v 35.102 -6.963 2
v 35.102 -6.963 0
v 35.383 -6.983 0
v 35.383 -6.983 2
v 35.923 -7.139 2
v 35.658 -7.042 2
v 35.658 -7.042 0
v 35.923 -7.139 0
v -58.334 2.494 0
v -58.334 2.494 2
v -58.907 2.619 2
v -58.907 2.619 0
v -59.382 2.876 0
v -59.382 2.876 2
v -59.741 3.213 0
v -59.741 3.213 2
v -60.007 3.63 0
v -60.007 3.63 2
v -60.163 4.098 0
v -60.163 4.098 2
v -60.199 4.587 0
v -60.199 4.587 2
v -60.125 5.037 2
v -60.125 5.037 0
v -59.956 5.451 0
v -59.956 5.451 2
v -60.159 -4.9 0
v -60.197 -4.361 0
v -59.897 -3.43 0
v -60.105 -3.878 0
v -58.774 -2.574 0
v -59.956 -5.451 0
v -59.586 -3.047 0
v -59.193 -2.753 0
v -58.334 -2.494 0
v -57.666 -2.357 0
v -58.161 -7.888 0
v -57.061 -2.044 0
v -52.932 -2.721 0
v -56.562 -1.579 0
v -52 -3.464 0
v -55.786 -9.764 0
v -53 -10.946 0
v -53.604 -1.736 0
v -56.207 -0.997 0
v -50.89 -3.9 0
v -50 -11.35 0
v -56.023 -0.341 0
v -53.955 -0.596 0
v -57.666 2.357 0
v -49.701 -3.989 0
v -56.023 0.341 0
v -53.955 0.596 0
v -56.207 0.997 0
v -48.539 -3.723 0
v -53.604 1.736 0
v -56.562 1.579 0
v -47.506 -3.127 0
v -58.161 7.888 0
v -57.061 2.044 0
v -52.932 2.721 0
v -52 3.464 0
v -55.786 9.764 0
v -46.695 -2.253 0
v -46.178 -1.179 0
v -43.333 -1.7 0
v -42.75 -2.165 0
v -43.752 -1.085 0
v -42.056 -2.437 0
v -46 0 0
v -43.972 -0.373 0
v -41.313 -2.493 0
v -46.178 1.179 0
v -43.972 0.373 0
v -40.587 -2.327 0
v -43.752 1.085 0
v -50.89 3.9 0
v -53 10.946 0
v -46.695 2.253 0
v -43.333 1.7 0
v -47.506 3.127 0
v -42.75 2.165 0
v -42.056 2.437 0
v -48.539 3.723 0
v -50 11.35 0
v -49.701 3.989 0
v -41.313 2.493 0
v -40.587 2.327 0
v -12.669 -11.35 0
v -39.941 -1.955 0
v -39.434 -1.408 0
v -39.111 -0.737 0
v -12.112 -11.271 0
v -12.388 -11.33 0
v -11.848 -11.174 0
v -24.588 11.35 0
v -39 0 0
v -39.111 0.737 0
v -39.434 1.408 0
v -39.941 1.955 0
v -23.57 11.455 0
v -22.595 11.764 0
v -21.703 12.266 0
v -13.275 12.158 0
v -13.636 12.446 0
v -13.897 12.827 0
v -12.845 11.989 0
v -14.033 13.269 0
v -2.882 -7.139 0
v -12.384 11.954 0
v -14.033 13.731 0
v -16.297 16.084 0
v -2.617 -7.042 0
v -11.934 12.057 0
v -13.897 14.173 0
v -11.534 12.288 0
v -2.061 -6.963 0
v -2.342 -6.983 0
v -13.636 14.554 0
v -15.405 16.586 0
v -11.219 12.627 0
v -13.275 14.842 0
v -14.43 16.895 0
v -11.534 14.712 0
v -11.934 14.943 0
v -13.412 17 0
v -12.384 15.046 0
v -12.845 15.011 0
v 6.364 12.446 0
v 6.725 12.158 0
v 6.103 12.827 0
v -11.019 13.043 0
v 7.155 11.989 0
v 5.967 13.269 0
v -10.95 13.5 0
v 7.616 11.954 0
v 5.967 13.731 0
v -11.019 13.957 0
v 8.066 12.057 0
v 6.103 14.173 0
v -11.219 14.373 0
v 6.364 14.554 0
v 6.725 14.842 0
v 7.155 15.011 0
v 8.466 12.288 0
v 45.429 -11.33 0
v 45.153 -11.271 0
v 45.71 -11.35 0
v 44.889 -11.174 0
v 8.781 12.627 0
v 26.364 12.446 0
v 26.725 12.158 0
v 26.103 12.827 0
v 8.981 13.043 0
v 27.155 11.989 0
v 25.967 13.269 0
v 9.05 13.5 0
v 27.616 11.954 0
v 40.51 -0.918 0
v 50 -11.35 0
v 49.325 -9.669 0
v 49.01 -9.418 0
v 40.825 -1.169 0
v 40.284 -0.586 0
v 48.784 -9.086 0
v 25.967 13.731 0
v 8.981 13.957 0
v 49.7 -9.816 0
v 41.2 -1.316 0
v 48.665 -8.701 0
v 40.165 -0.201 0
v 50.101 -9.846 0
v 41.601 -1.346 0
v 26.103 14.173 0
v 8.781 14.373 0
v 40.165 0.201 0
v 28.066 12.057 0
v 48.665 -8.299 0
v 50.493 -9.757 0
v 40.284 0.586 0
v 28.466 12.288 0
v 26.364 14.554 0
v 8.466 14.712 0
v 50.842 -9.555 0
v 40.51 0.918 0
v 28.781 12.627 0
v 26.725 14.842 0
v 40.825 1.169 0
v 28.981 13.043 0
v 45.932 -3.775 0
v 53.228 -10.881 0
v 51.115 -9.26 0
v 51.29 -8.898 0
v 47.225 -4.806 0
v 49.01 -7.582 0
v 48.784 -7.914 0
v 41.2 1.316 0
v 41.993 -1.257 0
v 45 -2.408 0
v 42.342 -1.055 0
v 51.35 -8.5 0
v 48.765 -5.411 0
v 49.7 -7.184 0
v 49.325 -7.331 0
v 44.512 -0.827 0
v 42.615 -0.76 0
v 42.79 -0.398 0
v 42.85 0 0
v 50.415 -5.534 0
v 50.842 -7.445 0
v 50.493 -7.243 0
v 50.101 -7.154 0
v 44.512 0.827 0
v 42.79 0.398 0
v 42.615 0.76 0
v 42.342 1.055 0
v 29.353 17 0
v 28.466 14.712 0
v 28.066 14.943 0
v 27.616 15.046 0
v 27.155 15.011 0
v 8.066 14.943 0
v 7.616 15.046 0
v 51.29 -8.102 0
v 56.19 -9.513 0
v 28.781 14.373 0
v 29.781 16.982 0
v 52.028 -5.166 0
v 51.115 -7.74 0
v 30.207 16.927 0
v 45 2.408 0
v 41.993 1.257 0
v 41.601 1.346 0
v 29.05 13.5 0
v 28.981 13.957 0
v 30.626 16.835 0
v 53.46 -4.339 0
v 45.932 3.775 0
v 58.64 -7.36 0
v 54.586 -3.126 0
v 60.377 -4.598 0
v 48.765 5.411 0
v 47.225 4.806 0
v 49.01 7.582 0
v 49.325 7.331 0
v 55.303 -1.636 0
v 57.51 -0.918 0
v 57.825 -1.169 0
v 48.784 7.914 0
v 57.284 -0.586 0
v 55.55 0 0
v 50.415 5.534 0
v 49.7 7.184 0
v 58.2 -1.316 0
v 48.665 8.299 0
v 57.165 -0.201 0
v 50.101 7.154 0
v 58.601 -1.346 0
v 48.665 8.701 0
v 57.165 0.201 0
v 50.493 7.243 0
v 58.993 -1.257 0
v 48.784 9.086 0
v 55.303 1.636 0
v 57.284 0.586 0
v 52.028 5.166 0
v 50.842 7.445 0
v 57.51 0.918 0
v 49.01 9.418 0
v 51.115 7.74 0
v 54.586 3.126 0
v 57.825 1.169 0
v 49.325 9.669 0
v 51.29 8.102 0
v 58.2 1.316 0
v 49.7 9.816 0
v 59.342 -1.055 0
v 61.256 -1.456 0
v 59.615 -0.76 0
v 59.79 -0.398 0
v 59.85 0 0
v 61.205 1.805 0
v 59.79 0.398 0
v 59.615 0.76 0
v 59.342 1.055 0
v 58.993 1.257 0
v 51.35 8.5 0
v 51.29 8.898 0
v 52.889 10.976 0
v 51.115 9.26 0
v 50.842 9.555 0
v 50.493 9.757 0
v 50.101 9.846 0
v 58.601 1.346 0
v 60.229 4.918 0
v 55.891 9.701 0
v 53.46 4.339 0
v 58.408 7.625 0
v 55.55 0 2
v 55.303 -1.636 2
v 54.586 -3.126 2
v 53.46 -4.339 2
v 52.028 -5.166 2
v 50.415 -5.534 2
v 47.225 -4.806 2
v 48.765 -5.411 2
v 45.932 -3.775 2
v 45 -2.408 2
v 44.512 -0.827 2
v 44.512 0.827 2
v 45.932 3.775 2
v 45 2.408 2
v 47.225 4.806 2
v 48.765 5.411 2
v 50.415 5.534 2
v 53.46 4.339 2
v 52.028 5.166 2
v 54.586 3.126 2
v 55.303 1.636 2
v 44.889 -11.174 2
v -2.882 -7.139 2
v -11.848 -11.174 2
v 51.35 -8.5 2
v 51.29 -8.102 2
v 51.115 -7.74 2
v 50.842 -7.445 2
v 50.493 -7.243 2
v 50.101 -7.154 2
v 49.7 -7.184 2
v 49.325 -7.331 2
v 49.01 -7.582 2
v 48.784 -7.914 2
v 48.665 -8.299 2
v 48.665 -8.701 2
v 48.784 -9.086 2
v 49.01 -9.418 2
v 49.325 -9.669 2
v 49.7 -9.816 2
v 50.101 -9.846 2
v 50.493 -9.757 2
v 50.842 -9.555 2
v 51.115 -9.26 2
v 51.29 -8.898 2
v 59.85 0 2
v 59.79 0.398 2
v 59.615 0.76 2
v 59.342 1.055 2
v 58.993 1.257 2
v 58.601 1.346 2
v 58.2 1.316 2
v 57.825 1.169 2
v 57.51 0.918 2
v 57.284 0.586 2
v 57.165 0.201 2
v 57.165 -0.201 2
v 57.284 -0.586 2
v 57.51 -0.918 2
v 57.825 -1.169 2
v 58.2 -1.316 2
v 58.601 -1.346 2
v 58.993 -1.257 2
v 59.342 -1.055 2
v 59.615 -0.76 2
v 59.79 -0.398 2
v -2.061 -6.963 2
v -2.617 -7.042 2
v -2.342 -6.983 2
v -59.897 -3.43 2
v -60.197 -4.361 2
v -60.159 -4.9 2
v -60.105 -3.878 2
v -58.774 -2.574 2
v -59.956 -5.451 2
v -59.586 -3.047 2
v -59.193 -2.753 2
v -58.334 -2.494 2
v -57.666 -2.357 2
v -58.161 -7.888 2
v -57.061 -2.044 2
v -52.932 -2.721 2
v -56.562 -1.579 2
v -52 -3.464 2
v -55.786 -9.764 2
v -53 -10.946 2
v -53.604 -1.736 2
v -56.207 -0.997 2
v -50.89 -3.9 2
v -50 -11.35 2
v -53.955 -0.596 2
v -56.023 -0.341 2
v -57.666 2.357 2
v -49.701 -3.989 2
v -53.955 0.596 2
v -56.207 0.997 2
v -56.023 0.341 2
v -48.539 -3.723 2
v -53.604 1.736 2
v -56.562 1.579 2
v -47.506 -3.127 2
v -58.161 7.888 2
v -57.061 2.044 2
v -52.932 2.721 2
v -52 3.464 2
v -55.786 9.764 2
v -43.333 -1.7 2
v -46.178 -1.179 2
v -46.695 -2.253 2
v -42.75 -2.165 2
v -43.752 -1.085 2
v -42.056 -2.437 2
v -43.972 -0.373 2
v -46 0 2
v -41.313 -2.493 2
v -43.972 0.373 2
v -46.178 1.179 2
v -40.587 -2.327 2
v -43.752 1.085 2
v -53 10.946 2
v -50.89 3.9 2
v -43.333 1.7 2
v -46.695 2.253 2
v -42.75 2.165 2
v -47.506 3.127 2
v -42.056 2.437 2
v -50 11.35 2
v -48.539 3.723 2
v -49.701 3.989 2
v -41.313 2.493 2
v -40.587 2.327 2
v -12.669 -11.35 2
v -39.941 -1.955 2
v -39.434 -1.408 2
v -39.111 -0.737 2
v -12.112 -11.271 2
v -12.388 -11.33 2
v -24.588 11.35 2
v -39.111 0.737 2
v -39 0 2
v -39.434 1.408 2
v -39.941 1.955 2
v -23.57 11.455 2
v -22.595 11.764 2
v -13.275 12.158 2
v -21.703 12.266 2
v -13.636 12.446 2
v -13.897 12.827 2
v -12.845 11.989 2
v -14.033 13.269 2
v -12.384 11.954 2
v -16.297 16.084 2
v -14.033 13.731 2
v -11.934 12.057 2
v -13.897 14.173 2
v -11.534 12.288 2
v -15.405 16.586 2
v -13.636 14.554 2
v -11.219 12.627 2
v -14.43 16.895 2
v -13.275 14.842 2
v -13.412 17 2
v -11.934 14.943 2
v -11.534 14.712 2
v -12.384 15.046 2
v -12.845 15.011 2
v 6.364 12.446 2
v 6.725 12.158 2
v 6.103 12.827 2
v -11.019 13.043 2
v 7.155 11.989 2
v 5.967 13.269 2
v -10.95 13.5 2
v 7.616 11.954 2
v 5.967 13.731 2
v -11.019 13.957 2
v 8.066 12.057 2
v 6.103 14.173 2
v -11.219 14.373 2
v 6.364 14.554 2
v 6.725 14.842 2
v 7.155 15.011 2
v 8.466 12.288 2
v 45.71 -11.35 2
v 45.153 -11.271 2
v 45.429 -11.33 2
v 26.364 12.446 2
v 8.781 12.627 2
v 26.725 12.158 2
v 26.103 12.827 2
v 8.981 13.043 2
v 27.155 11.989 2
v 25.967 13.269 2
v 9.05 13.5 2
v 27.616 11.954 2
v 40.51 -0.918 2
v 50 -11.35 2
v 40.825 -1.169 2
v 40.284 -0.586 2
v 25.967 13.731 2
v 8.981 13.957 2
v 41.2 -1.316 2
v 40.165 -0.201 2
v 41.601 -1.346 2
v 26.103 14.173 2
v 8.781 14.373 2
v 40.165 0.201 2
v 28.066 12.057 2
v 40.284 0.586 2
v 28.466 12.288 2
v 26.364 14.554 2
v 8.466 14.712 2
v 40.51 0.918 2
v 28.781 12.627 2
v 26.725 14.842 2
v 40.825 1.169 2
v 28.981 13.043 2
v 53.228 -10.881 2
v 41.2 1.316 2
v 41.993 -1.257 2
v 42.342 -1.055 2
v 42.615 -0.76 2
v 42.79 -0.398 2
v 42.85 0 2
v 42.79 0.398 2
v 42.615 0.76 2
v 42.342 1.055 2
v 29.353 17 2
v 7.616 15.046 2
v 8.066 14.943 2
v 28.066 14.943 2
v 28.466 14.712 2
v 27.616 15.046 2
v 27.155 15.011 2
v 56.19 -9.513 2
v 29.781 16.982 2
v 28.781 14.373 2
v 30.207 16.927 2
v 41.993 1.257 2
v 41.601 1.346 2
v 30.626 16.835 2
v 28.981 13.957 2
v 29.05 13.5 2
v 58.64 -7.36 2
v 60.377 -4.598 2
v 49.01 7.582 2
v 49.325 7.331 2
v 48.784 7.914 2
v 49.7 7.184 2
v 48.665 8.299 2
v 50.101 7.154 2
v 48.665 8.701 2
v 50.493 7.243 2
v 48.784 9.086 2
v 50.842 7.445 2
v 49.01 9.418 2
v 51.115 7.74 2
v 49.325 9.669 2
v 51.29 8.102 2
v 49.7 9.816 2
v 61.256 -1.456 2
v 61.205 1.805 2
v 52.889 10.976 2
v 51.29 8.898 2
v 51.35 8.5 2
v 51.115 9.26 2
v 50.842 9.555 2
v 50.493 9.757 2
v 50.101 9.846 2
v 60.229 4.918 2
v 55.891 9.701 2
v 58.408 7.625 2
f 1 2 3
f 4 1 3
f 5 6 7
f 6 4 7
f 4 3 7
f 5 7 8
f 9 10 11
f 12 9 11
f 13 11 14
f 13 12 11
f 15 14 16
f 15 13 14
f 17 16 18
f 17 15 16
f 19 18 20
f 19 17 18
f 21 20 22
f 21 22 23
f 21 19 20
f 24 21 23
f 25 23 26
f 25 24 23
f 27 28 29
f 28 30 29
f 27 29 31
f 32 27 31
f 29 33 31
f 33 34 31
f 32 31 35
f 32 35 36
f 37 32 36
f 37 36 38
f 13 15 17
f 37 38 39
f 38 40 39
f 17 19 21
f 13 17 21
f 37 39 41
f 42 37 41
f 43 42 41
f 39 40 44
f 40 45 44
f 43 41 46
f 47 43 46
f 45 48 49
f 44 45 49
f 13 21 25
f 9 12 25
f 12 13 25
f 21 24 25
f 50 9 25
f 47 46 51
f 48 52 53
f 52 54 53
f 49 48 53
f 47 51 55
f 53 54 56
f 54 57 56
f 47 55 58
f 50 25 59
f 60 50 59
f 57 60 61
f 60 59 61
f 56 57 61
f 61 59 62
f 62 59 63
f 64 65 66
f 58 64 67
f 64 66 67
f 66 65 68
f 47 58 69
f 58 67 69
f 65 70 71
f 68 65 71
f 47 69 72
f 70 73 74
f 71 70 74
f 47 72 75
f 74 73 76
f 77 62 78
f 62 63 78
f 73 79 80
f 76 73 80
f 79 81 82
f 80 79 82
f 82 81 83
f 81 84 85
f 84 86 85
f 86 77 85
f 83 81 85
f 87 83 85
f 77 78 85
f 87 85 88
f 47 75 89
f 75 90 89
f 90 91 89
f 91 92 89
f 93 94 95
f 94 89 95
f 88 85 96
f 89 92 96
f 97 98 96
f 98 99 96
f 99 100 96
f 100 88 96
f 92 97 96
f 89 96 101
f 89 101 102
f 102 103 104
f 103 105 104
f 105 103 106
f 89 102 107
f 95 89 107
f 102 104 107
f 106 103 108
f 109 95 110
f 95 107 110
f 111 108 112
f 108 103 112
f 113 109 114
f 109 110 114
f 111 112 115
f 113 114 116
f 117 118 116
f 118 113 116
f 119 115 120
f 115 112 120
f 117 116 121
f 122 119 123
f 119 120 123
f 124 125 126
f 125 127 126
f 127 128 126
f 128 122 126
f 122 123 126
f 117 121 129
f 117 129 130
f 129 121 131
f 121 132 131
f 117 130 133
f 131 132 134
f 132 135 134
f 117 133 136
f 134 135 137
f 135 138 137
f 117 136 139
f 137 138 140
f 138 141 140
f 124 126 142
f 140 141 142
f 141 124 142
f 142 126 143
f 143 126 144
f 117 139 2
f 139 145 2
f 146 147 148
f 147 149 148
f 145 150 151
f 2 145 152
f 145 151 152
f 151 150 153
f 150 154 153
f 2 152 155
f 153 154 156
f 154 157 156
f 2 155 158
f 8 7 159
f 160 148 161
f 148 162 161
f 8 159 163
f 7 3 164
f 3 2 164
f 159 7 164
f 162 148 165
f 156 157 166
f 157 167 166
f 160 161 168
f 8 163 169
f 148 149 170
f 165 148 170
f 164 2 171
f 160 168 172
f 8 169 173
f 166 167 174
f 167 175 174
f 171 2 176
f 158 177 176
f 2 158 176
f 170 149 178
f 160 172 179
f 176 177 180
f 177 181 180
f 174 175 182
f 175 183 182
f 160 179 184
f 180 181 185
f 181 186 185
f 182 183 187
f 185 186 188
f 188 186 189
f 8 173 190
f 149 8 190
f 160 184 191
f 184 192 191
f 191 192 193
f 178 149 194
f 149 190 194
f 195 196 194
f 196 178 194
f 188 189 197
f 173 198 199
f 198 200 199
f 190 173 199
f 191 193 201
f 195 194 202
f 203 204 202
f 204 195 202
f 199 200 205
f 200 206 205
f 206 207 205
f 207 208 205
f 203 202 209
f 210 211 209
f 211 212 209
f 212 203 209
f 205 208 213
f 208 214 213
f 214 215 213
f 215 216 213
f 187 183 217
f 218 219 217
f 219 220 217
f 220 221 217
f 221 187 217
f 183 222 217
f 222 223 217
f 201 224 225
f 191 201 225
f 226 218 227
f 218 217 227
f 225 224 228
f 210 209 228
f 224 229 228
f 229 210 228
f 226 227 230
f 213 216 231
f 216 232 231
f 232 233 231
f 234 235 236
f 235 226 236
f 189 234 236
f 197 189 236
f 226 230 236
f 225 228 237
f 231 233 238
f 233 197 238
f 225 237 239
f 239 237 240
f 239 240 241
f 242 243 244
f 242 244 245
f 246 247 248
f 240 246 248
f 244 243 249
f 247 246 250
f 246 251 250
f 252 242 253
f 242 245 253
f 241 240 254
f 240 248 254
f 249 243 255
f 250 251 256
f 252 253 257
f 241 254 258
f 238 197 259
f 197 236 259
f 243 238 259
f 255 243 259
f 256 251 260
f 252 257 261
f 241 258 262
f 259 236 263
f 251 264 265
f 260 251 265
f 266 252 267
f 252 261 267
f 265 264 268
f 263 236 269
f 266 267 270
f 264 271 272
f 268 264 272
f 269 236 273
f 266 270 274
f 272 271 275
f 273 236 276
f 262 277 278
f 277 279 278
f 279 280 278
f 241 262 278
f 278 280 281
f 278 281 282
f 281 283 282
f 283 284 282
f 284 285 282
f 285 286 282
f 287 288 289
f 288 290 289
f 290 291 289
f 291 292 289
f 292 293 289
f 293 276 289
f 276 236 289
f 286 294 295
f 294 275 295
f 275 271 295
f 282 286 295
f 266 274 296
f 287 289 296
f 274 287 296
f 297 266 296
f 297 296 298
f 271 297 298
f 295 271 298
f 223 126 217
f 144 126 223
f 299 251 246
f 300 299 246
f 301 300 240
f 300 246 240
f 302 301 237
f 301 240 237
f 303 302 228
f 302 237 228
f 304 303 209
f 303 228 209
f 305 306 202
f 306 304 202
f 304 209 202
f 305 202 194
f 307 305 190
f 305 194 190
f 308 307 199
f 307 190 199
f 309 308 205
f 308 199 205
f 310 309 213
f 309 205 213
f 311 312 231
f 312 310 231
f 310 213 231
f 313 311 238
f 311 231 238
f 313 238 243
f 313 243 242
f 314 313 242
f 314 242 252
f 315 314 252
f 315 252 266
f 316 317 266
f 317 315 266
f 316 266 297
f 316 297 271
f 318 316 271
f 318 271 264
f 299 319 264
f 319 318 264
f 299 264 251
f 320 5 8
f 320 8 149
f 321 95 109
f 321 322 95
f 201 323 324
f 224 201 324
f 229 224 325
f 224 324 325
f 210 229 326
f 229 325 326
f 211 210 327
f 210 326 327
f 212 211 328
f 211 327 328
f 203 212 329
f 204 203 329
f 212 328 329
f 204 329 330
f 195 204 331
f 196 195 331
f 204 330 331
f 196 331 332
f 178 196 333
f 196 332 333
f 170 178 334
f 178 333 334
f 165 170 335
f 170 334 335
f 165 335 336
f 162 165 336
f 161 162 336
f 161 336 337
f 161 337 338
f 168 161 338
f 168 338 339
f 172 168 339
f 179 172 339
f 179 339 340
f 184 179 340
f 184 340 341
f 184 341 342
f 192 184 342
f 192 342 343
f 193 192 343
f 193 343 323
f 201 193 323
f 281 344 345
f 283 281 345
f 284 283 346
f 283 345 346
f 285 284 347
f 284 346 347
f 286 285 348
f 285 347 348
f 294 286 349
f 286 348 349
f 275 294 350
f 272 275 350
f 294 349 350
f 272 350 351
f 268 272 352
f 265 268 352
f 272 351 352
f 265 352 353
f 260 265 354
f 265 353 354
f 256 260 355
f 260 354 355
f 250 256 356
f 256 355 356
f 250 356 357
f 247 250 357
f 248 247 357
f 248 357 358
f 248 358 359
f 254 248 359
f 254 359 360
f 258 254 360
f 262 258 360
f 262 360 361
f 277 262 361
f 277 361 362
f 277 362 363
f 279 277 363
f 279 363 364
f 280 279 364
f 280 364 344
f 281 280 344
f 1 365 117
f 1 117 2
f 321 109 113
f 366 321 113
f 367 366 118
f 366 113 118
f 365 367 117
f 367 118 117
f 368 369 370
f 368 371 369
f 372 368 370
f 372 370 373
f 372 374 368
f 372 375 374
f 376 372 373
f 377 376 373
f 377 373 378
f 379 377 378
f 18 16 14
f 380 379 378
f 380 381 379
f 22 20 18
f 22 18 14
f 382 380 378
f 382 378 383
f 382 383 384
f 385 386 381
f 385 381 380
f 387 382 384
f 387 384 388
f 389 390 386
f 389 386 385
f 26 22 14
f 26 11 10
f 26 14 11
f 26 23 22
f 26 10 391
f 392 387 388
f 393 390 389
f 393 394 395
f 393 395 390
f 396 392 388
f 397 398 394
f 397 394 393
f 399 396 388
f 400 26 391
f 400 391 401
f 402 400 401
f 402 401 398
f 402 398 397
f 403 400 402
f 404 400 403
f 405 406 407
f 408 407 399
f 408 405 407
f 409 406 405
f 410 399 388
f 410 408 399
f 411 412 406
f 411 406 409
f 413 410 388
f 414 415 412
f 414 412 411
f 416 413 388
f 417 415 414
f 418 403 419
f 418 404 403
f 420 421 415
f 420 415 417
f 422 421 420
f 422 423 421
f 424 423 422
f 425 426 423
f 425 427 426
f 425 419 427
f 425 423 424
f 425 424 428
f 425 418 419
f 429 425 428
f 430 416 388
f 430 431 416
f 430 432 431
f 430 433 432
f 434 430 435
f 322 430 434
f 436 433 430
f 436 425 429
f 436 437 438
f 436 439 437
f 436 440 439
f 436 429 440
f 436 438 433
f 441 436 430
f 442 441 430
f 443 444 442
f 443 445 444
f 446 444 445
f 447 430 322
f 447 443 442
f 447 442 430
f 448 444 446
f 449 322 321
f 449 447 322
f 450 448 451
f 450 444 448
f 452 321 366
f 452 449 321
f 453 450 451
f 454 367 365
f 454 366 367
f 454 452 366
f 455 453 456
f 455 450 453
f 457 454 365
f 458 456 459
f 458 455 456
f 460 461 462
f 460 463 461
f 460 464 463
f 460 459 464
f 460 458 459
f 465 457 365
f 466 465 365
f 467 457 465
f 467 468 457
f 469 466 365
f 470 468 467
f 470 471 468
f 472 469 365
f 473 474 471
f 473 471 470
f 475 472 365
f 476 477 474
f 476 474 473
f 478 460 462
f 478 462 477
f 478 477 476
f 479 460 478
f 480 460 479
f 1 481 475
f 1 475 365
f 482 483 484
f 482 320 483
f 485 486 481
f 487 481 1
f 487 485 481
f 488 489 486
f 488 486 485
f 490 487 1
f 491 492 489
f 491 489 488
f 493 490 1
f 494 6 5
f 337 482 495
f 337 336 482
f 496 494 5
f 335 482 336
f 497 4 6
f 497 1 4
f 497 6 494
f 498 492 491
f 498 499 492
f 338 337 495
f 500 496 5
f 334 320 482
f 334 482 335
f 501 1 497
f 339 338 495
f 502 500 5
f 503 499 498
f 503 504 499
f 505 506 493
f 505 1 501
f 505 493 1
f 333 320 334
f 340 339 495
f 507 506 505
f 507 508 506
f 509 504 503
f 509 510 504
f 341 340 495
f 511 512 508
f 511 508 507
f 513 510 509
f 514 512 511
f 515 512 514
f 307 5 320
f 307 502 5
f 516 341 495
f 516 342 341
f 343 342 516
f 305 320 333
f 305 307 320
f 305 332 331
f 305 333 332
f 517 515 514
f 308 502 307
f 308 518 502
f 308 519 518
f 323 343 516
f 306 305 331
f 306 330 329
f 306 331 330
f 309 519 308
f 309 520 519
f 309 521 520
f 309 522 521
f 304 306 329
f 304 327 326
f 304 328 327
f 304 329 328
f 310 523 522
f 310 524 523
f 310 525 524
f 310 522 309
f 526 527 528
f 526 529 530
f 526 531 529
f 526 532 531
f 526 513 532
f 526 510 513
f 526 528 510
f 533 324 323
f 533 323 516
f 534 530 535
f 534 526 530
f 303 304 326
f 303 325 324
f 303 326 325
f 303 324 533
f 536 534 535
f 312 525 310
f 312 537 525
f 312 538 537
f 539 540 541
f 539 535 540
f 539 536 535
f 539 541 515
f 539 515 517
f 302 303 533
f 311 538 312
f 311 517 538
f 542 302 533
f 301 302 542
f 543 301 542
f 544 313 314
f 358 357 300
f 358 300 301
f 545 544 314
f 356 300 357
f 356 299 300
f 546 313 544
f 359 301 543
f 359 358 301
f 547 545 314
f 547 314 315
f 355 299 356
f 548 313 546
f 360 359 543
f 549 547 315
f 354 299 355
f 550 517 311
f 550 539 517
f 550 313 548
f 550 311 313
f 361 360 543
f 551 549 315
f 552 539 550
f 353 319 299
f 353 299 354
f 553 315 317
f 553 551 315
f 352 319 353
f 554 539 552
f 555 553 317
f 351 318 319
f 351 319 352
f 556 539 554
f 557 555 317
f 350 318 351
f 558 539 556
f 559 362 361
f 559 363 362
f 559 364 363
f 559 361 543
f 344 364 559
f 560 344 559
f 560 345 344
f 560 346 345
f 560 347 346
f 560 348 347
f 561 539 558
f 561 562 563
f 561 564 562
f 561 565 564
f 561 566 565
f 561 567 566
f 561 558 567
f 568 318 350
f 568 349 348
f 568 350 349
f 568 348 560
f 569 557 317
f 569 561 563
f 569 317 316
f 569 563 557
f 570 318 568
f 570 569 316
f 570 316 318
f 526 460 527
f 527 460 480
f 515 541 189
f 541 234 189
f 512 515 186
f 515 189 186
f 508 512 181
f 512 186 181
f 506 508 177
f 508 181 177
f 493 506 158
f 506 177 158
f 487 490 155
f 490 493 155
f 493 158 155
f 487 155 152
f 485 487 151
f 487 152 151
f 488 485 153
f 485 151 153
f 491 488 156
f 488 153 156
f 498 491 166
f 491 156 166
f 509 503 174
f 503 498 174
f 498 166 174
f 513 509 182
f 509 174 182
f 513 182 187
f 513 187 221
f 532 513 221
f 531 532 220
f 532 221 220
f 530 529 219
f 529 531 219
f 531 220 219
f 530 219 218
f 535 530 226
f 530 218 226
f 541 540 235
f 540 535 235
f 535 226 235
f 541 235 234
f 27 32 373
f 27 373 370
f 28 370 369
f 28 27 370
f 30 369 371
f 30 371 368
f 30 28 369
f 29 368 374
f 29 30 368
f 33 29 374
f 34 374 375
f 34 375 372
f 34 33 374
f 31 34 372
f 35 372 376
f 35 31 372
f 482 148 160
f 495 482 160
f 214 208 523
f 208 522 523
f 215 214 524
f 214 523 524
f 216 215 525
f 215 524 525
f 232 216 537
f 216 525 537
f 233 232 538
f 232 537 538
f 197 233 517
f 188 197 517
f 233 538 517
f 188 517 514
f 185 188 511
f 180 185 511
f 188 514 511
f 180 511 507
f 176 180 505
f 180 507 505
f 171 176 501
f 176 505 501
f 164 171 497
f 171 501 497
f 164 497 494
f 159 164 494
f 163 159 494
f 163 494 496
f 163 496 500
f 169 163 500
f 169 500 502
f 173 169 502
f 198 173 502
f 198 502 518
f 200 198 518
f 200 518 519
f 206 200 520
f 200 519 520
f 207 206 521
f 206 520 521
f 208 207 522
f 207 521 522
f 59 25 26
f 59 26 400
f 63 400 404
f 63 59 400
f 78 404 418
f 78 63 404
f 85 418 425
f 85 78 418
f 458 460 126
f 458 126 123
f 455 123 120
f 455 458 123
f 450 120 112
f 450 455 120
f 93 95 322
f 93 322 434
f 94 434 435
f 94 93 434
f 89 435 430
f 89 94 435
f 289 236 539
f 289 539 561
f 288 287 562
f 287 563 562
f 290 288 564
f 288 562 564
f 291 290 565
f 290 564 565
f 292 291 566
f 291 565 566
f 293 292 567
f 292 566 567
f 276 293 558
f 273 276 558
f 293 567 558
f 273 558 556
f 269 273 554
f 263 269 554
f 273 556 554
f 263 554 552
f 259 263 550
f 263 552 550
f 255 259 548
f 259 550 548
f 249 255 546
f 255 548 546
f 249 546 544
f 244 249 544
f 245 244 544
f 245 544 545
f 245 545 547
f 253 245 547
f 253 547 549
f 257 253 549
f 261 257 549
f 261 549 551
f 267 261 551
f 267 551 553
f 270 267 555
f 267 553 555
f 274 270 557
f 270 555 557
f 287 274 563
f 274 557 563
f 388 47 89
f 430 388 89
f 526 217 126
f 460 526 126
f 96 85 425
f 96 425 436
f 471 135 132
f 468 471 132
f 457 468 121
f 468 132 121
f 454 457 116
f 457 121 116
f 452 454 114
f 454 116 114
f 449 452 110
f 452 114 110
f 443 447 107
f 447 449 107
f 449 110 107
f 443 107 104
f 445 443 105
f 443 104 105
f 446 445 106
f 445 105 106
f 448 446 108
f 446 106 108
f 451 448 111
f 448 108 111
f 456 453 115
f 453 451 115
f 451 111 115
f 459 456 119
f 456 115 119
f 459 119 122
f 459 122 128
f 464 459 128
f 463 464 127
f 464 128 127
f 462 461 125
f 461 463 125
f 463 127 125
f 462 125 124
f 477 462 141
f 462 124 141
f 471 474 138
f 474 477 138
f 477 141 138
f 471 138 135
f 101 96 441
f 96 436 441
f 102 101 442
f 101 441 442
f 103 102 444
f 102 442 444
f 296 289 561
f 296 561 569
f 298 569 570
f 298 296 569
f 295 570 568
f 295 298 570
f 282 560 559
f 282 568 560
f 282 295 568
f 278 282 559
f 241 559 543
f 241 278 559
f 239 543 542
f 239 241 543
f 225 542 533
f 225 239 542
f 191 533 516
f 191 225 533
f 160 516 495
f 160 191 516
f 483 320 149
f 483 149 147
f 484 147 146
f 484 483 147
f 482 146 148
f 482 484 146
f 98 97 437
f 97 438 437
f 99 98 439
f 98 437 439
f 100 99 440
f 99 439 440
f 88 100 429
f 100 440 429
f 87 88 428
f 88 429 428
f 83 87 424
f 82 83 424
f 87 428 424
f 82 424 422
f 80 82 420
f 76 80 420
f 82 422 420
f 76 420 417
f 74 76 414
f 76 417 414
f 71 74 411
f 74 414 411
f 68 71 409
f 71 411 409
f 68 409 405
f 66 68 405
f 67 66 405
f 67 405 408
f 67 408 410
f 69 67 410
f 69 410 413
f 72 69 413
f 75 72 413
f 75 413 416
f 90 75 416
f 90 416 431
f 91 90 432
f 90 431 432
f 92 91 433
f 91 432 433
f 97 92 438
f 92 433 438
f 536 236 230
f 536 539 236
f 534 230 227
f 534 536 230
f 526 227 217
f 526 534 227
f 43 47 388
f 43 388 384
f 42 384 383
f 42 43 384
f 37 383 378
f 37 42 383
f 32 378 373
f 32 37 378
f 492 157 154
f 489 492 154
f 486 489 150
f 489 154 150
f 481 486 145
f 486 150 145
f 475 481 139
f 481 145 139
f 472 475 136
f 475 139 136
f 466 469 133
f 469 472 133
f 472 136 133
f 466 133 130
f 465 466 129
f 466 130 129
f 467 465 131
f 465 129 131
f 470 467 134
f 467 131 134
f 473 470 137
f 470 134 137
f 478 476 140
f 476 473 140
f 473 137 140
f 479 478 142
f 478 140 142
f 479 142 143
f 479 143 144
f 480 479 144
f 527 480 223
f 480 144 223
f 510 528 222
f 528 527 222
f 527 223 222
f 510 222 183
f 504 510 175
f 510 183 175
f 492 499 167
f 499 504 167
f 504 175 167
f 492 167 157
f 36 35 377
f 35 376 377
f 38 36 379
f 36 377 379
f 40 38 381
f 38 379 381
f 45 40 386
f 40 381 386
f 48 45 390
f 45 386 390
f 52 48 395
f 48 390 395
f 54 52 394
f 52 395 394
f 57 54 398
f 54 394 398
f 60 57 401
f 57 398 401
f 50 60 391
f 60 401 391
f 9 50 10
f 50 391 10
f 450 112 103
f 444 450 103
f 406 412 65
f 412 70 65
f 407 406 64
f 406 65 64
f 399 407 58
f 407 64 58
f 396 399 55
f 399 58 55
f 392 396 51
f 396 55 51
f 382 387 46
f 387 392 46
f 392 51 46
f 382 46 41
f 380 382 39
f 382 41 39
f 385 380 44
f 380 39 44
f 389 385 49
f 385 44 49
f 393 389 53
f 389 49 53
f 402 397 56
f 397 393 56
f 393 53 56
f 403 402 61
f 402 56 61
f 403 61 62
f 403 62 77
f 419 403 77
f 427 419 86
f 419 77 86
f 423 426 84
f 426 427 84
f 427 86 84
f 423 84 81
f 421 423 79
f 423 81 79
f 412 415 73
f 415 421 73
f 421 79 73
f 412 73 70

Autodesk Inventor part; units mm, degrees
ref_plane "YZ Plane" through (0, 0, 0) normal (1, 0, 0) x (0, 1, 0)
ref_plane "XZ Plane" through (0, 0, 0) normal (0, 1, 0) x (-1, 0, 0)
ref_plane "XY Plane" through (0, 0, 0) normal (0, 0, 1) x (1, 0, 0)
sketch "スケッチ1" plane through (0, 0, 0) normal (0, 0, 1) x (1, 0, 0)
  line L0 (-50, 0) -> (50, 0) construction
  circle A0 centre (-50, 0) radius 4
  circle A1 centre (50, 0) radius 5.55
  line L1 (-50, 11.35) -> (-23, 11.35)
  line L2 (-50, -11.35) -> (50, -11.35)
  arc A2 (50, -11.35) -> (50, 11.35) centre (50, 0) ccw
  line L3 (30, 17) -> (-15, 17)
  line L4 (-15, 17) -> (-23, 11.35)
  line L5 (-24.9115, 10) -> (41.8474, 10) construction
  line L6 (-15, 17) -> (-15, 10) construction
  line L7 (30, 17) -> (30, 10) construction
  circle A3 centre (27.5, 13.5) radius 1.55
  circle A4 centre (-12.5, 13.5) radius 1.55
  circle A5 centre (7.5, 13.5) radius 1.55
  line L8 (-15, 13.5) -> (30, 13.5) construction
  line L9 (30, 16) -> (-15, 16) construction
  line L10 (-15, 16) -> (-15, 11) construction
  line L11 (-15, 11) -> (30, 11) construction
  line L12 (30, 11) -> (30, 16) construction
  line L13 (-23, 11.35) -> (50, 11.35)
  arc A6 (-50, 11.35) -> (-50, -11.35) centre (-50, 0) ccw
  line L14 (7.5, 17) -> (7.5, 10.5172) construction
  line L15 (30, 17) -> (52.8887, 10.9762)
  point P0 (0, 0)
  point P1 (0, 0)
  point P2 (55.7736, 9.7718)
  point P3 (38, 11.35)
  dimension "d0" = 100
  dimension "d1" = 8
  dimension "d8" = 11.1
  dimension "d10" = 7
  dimension "d11" = 45
  dimension "d12" = 2.5
  dimension "d13" = 3.1
  dimension "d14" = 2.5
  dimension "d15" = 20
  dimension "d17" = 5
  dimension "d18" = 11
  dimension "d69" = 11.35
  dimension "d72" = 11.35
  dimension "d87" = 8
  dimension "d88" = 8
extrude "押し出し1" add sketch "スケッチ1" along normal blind 2
fillet "フィレット1" radius 5 4 edges at (-23, 11.35, 1) (-15, 17, 1) (30, 17, 1) (-50, 11.35, 1)
sketch "スケッチ2" plane through (0, 0, 2) normal (0, 0, 1) x (1, 0, 0)
  arc A0 (50, -11.35) -> (52.8887, 10.9762) centre (50, 0) ccw projected
  line L0 (18, -20) -> (-35.4549, -20) construction
  line L1 (-76.9372, -11.5) -> (-72, -11.5)
  line L2 (-76.9372, -12.4) -> (-76.9372, -11.5)
  line L3 (-71.9872, -11.45) -> (-76.9872, -11.45)
  line L4 (-76.9872, -11.45) -> (-76.9872, -12.45)
  circle A1 centre (-50, 0) radius 4 projected
  circle A2 centre (-50, 0) radius 5.5 construction
  circle A3 centre (50, 0) radius 5.55 projected
  line L5 (83.3205, -17.7128) -> (50, 0) construction
  line L6 (50, 0) -> (18, -20) construction
  line L7 (83.3205, -17.7128) -> (37.8533, -17.7128) construction
  line L8 (-13.4166, -12.4128) -> (46.4577, -12.4128)
  line L9 (46.4577, -12.4128) -> (46.4577, -11.5128)
  line L10 (46.4577, -11.5128) -> (45.5205, -11.5128)
  line L11 (45.5205, -11.5128) -> (35.5205, -7.0128)
  line L12 (35.5205, -7.0128) -> (-2.4795, -7.0128)
  line L13 (-2.4795, -7.0128) -> (-12.4795, -11.5128)
  line L14 (-12.4795, -11.5128) -> (-13.4166, -11.5128)
  line L15 (-13.4166, -11.5128) -> (-13.4166, -12.4128)
  line L16 (-12.4902, -11.4628) -> (-2.4902, -6.9628)
  line L17 (-2.4902, -6.9628) -> (35.5312, -6.9628)
  line L18 (35.5312, -6.9628) -> (45.5312, -11.4628)
  line L19 (45.5312, -11.4628) -> (46.5077, -11.4628)
  line L20 (46.5077, -11.4628) -> (46.5077, -12.4628)
  line L21 (46.5077, -12.4628) -> (-13.4666, -12.4628)
  line L22 (-13.4666, -12.4628) -> (-13.4666, -11.4628)
  line L23 (-13.4666, -11.4628) -> (-12.4902, -11.4628)
  point P0 (56.6914, 9.1677)
  point P1 (0, 0)
  point P2 (50, 11.35)
  dimension "d19" = 20
  dimension "d20" = 32
  dimension "d32" = 11
  dimension "d33" = 120
  dimension "d37" = 37.8
  dimension "d38" = 6.2
  dimension "d39" = 0.05
  dimension "d49" = 38
  dimension "d50" = 10
  dimension "d51" = 10
  dimension "d52" = 4.5
  dimension "d53" = 0.9
  dimension "d54" = 59.9743
extrude "押し出し2" cut sketch "スケッチ2" against normal blind 10 contours L15 L14 L13 L12 L11 L10 L9 L8 | L16 L17 L18 L19 L20 L21 L22 L23
fillet "フィレット2" radius 2 4 edges at (45.2805, -11.35, 1) (-12.2395, -11.35, 1) (35.5312, -6.9628, 1) (-2.4902, -6.9628, 1)
sketch "スケッチ4" plane through (0, 0, 2) normal (0, 0, 1) x (1, 0, 0)
  circle A0 centre (50, 0) radius 5.55 projected
  circle A1 centre (50, 0) radius 8.5 construction
  line L0 (50, 0) -> (50, 8.5) construction
  circle A2 centre (50, 8.5) radius 1.35
  circle A3 centre (41.5, 0) radius 1.35
  circle A4 centre (50, -8.5) radius 1.35
  circle A5 centre (58.5, 0) radius 1.35
  point P0 (0, 0)
  dimension "d61" = 17
  dimension "d62" = 2.7
  dimension "d65" = 360
extrude "押し出し4" cut sketch "スケッチ4" against normal through all contours A2 | A3 | A4 | A5
sketch "スケッチ6" plane through (0, 0, 2) normal (0, 0, 1) x (1, 0, 0)
  circle A0 centre (-50, 0) radius 4 projected
  circle A1 centre (-50, 0) radius 8.5 construction
  circle A2 centre (-58.5, 0) radius 2.5
  line L0 (-50, 0) -> (-58.5, 0) construction
  line L1 (-50, 0) -> (-41.5, 0) construction
  circle A3 centre (-41.5, 0) radius 2.5
  arc A4 (-50, 11.35) -> (-50, -11.35) centre (-50, 0) ccw projected
  line L2 (-58.5, -2.5) -> (-61.0712, -2.5)
  line L3 (-58.5, 2.5) -> (-61.0712, 2.5)
  point P0 (0, 0)
  dimension "d78" = 17
  dimension "d79" = 5
  dimension "d82" = 360
extrude "押し出し6" cut sketch "スケッチ6" against normal through all contours A2 | A2 L2 A4 L3 | A3
fillet "フィレット4" radius 2 2 edges at (-61.0712, 2.5, 1) (-61.0712, -2.5, 1)
equation "\"d14\" = d12"
properties part number "リンク_メインフレーム_6_4" material "GFRP"
